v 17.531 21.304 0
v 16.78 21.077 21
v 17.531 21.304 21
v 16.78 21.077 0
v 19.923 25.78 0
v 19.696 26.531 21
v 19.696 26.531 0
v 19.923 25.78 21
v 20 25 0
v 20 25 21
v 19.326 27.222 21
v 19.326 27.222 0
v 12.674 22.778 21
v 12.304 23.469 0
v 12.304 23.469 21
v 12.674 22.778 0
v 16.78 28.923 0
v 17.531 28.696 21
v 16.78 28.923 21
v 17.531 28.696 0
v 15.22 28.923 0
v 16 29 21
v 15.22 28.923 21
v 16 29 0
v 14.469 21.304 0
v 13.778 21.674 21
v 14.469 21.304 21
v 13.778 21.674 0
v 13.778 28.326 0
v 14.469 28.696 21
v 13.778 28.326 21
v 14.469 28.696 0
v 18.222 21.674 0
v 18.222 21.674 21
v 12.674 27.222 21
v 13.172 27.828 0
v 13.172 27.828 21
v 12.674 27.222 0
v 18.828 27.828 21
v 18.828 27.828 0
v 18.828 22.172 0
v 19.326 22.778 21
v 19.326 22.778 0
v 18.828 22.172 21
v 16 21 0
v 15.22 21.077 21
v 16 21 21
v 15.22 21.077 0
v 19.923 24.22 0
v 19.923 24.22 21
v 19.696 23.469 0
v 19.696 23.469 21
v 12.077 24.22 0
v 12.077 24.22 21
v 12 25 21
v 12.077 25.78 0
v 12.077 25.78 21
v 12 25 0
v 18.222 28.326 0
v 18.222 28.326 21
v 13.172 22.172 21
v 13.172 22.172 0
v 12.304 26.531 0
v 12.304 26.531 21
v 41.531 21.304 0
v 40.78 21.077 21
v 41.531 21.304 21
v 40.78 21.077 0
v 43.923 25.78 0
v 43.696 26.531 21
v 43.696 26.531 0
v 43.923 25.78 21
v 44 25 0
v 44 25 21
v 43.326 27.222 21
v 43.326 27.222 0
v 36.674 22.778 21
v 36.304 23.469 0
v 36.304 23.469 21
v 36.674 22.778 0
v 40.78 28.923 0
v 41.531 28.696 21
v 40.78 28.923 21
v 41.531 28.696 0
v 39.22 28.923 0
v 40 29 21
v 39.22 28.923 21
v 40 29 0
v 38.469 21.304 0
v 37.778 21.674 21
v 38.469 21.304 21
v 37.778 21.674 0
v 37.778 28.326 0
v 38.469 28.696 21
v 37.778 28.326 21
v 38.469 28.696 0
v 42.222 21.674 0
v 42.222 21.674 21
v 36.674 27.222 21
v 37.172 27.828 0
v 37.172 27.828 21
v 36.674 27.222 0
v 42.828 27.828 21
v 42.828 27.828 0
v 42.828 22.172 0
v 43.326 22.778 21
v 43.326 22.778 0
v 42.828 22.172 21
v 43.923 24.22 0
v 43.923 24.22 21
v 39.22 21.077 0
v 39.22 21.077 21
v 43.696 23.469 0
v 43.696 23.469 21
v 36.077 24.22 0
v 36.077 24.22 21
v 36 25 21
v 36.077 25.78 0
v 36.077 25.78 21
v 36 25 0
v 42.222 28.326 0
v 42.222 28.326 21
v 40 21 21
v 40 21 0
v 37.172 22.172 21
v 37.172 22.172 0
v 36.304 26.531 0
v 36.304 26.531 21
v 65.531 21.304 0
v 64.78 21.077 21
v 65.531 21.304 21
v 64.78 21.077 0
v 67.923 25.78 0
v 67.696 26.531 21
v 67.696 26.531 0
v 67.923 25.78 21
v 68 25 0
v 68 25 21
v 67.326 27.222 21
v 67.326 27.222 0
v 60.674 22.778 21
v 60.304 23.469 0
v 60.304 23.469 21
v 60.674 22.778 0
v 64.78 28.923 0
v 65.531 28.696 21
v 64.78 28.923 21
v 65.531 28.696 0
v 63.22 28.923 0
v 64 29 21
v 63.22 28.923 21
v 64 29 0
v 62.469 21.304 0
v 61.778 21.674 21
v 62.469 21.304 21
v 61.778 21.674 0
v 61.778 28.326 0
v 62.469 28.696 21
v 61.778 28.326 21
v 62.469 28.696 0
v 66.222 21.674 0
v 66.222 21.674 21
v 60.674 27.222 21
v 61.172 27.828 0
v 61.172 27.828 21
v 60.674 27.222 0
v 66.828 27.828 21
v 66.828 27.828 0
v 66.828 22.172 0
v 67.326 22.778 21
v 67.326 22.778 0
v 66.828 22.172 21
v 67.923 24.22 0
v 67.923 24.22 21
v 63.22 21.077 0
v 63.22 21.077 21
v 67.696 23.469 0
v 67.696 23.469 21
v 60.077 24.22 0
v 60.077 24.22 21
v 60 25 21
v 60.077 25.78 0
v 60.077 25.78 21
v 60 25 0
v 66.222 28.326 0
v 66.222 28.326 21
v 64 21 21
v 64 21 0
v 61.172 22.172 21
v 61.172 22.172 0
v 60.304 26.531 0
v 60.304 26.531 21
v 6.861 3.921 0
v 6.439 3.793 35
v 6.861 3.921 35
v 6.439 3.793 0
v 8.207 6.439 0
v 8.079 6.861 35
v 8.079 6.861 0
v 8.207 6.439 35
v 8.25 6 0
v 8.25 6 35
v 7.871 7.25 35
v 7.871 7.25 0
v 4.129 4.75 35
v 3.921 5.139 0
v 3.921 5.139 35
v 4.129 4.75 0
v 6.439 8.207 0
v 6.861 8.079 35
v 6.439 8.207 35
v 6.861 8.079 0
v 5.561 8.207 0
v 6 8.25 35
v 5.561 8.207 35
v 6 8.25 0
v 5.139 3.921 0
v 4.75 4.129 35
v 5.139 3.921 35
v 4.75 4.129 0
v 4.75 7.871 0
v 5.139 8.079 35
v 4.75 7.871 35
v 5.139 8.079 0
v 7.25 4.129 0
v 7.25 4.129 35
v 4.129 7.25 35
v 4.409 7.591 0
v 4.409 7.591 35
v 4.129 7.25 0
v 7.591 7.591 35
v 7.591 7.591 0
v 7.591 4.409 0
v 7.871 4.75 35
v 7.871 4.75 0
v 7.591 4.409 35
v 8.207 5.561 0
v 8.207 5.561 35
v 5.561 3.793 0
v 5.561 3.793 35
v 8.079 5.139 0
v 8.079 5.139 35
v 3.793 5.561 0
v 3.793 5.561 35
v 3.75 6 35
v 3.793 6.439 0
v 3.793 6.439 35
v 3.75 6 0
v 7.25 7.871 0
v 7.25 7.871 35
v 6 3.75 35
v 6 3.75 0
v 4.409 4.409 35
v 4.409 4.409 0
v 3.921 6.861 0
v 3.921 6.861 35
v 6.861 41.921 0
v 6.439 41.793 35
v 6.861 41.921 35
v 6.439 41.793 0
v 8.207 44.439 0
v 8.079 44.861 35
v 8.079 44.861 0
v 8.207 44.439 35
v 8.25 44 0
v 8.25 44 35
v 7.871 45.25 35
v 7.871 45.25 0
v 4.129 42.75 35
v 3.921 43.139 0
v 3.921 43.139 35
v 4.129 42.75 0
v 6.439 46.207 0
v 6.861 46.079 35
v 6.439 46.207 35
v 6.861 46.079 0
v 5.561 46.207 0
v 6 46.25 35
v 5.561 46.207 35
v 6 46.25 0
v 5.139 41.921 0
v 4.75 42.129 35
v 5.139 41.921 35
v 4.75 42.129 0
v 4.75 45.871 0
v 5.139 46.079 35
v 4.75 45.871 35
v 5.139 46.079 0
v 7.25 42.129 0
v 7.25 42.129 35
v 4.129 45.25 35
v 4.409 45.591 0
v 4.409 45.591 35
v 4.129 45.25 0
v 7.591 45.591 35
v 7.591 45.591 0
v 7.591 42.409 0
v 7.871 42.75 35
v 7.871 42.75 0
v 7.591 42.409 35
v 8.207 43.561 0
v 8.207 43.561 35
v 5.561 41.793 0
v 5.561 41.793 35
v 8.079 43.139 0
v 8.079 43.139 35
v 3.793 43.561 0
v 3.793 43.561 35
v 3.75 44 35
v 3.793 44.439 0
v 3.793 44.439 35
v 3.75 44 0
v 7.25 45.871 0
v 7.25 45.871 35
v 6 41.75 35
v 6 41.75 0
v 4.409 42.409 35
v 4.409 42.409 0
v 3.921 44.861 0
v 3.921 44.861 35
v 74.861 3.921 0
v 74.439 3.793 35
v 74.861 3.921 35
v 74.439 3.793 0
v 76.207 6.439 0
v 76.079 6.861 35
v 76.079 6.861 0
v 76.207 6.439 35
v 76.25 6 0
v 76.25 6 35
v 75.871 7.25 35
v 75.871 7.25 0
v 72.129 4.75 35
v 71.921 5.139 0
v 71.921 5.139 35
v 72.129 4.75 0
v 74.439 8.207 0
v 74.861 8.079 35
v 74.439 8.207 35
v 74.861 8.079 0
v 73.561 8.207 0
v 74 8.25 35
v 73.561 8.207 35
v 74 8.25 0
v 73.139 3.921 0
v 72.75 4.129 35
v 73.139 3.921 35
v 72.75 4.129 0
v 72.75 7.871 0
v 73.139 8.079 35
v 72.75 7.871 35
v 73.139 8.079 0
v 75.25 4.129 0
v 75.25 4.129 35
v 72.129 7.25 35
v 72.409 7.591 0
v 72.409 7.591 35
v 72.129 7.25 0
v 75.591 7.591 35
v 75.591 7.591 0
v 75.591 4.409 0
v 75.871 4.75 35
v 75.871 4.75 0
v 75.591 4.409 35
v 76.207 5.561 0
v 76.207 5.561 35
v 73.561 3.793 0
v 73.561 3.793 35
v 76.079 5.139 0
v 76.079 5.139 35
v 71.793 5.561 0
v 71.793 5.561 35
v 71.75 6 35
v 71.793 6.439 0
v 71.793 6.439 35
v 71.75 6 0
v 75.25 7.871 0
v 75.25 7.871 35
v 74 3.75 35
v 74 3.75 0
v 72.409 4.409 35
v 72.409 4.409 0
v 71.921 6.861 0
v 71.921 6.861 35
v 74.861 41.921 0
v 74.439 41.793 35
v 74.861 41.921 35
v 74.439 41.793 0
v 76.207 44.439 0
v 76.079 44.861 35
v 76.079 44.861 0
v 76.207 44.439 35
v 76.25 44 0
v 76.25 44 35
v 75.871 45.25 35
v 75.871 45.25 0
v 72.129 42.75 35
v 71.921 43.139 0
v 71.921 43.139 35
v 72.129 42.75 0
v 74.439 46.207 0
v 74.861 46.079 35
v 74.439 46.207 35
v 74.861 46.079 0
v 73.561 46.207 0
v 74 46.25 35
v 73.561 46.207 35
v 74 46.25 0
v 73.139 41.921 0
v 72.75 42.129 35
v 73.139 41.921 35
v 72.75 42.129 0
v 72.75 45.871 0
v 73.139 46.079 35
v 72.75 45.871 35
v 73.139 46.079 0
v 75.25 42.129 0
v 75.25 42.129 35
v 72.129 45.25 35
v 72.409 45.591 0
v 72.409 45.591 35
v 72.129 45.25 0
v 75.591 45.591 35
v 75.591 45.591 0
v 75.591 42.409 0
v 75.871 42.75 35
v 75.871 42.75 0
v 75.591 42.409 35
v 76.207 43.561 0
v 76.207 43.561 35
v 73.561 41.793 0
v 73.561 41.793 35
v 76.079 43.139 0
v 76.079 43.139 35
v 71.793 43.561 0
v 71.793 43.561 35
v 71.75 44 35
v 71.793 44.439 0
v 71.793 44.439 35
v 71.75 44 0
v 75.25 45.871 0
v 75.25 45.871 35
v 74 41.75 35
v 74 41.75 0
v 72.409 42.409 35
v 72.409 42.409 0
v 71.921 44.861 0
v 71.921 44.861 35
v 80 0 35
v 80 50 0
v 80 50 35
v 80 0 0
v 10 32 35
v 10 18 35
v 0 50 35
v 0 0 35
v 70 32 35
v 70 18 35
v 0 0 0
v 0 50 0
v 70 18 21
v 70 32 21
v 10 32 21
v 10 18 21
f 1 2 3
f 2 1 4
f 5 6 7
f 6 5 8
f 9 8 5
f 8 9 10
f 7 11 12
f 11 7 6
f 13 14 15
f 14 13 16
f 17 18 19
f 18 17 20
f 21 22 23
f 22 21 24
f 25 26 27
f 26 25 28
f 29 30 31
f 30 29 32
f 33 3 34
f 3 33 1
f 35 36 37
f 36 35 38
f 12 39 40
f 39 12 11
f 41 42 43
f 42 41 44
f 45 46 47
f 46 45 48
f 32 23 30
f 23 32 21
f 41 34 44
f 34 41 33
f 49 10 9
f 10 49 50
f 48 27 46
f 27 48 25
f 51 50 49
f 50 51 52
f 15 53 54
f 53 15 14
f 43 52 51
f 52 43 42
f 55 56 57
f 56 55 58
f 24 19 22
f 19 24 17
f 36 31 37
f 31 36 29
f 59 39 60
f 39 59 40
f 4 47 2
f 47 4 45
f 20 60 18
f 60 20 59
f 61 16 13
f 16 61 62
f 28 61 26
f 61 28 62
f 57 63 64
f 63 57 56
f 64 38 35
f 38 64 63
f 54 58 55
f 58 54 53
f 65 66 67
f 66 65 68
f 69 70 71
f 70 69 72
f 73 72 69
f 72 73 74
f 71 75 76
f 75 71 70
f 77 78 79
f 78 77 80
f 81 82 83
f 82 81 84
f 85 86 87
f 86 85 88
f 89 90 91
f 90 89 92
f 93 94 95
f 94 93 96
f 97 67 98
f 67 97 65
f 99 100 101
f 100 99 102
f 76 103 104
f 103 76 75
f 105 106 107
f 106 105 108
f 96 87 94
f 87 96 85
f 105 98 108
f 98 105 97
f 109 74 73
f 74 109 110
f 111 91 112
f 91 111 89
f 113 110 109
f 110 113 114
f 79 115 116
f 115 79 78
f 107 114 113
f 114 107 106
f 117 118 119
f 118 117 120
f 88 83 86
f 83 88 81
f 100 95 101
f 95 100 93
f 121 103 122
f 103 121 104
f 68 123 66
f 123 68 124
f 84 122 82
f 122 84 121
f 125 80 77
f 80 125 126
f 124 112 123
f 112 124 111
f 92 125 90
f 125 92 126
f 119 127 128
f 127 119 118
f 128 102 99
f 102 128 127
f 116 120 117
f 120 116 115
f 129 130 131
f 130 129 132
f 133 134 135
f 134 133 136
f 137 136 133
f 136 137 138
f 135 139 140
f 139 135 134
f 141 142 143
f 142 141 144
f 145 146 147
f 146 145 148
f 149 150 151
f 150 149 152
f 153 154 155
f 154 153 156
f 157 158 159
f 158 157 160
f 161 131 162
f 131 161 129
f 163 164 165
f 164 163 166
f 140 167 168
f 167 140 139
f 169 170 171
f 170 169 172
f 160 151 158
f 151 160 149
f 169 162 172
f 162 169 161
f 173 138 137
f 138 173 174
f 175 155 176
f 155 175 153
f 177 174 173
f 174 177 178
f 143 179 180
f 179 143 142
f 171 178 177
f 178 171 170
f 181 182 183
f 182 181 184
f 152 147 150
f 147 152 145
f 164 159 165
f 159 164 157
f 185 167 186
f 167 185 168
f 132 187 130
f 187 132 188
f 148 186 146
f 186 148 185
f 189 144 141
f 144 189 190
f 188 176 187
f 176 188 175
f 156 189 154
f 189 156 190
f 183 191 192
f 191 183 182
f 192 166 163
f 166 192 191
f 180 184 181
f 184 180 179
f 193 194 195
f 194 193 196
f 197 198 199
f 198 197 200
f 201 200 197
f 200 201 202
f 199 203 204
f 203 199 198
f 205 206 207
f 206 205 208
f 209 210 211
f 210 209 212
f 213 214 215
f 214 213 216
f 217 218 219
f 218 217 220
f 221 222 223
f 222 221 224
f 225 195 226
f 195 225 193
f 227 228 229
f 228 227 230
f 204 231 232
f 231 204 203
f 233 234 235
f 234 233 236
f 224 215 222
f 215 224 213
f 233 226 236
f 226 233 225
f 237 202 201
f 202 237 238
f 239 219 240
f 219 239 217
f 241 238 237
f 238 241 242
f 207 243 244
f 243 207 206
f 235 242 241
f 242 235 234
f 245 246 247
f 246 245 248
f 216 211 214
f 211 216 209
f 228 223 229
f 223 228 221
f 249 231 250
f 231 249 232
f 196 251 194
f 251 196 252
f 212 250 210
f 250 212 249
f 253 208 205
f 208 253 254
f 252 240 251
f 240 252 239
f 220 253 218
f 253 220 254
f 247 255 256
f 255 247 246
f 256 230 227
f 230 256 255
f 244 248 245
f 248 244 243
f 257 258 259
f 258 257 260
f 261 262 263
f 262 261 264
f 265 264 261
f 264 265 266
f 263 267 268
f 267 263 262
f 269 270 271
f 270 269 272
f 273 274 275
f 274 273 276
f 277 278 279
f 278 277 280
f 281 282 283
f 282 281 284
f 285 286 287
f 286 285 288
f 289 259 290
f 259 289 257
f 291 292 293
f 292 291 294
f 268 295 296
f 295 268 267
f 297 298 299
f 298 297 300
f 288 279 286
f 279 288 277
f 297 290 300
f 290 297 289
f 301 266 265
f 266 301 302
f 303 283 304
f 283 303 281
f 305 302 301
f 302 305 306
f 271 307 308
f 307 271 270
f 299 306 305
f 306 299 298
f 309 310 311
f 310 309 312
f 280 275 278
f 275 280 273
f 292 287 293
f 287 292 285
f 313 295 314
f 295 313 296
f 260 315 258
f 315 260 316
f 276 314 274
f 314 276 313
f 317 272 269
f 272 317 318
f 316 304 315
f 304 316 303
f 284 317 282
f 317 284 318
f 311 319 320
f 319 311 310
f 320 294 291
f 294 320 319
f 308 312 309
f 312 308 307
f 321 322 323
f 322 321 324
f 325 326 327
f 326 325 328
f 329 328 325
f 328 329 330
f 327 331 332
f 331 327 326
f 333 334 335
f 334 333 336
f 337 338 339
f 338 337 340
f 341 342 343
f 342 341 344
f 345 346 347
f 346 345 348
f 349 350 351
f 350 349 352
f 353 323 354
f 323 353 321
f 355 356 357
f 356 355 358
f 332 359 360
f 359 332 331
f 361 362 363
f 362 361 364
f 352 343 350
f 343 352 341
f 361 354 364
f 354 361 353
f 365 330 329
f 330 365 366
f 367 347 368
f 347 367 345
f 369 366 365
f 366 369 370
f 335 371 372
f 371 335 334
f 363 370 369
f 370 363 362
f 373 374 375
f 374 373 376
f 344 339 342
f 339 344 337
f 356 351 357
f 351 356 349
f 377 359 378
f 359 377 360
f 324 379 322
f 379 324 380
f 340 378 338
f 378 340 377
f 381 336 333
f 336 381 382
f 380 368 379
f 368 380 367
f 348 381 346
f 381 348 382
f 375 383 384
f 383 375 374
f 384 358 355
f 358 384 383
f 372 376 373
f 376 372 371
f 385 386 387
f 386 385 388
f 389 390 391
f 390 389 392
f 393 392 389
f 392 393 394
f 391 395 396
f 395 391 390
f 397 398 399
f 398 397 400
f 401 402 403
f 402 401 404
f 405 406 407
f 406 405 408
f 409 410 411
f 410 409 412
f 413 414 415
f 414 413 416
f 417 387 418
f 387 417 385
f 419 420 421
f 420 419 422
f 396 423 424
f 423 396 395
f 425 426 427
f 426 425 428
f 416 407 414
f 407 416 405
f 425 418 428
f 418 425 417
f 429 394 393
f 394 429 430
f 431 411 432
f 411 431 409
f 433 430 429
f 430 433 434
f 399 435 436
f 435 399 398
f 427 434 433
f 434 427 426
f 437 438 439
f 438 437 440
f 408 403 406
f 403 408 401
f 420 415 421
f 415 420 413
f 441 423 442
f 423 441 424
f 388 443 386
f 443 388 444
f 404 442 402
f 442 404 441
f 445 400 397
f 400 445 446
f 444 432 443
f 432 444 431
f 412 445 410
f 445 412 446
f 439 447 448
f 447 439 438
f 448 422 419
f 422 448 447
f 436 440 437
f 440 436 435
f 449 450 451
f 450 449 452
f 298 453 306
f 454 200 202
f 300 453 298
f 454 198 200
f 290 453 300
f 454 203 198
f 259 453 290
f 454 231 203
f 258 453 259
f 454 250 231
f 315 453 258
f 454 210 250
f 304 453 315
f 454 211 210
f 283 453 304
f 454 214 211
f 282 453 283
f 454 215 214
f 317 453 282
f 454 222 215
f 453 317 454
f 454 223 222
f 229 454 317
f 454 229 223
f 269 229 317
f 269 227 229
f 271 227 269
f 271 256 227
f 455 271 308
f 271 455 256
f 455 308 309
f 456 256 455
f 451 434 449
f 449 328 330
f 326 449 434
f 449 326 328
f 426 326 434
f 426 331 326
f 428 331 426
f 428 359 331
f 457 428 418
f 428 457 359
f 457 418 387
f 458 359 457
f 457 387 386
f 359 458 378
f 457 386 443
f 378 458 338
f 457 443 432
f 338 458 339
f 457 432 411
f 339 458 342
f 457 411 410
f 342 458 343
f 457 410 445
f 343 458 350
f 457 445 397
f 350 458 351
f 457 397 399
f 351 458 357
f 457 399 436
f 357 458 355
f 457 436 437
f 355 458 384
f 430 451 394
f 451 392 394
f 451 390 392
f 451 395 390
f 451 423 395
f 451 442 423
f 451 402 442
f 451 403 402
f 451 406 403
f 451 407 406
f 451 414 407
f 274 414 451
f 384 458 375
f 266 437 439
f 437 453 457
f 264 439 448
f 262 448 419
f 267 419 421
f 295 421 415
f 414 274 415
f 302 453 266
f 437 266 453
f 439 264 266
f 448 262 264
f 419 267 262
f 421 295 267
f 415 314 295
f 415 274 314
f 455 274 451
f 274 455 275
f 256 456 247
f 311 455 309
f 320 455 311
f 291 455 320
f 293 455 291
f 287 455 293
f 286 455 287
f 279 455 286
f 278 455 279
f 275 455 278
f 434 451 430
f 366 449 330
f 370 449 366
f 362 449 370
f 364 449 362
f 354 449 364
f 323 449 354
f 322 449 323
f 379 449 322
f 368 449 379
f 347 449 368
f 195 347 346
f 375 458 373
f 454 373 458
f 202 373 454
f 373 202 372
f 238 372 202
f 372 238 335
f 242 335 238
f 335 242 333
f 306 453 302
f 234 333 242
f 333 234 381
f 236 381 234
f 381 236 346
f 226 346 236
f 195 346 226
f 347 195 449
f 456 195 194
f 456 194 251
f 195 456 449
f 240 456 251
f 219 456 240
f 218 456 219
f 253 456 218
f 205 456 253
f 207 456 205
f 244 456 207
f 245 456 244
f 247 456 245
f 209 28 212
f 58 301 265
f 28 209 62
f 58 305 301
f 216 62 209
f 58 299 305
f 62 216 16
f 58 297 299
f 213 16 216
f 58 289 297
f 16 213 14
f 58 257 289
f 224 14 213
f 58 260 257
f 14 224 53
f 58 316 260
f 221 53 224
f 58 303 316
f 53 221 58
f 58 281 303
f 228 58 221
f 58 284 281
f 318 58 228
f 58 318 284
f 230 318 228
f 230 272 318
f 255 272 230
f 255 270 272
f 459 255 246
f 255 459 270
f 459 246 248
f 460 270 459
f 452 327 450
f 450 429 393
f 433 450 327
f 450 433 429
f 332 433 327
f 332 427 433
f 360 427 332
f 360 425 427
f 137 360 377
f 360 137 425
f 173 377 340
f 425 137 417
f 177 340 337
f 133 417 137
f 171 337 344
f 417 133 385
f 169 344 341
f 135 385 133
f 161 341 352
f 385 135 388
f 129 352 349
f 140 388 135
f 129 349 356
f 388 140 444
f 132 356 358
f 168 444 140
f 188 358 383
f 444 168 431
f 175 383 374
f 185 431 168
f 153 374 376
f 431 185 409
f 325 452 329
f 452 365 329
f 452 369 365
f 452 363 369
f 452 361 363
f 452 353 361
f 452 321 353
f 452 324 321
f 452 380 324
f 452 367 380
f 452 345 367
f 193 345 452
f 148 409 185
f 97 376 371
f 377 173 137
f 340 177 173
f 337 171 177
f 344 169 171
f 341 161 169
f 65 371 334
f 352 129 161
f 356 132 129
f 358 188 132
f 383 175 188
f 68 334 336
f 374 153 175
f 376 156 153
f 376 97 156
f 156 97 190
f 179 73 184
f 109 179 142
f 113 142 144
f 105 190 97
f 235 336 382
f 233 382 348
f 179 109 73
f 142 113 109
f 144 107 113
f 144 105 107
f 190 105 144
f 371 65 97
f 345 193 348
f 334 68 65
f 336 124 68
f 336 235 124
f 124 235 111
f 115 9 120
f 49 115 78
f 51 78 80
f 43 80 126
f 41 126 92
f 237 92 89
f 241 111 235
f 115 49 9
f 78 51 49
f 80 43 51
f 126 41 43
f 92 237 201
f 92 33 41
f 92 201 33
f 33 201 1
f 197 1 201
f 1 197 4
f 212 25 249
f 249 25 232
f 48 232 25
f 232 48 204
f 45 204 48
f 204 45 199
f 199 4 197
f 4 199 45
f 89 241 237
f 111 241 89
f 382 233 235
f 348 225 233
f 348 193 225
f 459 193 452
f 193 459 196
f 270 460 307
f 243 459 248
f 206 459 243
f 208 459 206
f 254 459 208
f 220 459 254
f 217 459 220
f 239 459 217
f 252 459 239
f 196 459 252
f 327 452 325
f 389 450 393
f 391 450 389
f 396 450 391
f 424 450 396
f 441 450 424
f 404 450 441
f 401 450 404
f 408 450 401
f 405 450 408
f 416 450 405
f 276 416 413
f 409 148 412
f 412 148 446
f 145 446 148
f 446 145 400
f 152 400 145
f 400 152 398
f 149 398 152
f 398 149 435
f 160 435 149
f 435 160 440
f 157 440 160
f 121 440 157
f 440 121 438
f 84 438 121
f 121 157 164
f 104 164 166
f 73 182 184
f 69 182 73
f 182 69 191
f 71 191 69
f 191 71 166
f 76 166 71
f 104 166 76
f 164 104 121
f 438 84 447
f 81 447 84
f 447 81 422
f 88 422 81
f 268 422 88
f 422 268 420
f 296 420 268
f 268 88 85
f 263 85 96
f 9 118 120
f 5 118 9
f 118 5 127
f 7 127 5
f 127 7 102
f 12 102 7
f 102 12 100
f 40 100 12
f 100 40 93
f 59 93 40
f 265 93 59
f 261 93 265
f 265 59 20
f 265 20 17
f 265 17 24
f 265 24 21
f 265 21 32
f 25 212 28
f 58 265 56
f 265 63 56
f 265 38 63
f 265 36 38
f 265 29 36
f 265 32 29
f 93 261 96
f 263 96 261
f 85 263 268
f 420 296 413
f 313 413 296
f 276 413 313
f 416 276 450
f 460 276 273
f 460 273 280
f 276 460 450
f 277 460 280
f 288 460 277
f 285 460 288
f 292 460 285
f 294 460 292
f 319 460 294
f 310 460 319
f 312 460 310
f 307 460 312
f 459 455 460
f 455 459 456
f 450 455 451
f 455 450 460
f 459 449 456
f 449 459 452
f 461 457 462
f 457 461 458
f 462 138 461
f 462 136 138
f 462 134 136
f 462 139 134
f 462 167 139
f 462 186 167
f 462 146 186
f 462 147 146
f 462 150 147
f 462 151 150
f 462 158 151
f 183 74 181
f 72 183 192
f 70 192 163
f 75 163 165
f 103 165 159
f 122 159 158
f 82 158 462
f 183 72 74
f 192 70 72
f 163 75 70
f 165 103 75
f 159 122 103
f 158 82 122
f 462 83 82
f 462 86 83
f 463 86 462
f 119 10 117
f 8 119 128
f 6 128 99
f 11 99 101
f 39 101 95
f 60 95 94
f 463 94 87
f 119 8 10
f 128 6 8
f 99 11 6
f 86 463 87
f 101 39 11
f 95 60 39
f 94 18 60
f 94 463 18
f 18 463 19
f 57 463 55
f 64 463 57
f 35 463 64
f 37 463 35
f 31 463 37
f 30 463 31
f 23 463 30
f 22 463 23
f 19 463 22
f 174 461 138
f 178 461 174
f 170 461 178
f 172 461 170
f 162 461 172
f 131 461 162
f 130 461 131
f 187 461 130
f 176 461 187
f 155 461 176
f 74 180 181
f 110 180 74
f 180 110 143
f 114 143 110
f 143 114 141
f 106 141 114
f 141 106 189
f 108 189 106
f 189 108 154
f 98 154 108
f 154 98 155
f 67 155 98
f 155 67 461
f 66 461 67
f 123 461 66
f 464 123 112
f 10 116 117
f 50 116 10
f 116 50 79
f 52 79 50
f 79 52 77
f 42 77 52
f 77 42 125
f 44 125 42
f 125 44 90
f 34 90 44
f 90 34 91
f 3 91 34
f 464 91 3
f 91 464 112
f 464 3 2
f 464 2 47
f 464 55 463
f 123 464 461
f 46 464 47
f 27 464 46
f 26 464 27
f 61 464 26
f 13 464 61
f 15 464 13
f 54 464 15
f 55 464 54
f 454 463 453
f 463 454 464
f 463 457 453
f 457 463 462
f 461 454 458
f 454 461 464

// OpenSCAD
$fn = 32;

// ----------------------------------------------------------------------
// Manifold block: gallery_top manifold
// ----------------------------------------------------------------------

// --- parameters (mm) ---
block_l = 80;             // block length, X
block_w = 50;             // block width, Y
block_h = 35;             // block height, Z
port_d = 8;               // port bore diameter
port_pitch = 24;          // port pitch along X
gallery_d = 14;           // top gallery width, Y
gallery_depth = 14;       // gallery pocket depth
wall_p = 10;              // gallery end wall thickness, X
mnt_d = 4.5;              // mounting hole diameter
mnt_in = 6;               // mounting hole inset from the edges

n_ports = 3;  // ports in the row
port_x0 = (block_l - (n_ports - 1) * port_pitch) / 2;  // first port X

difference() {
  cube([block_l, block_w, block_h]);
  for (i = [0 : n_ports - 1])
    translate([port_x0 + i * port_pitch, block_w / 2, -1])
      cylinder(h = block_h + 2, d = port_d);
  translate([wall_p, block_w / 2 - gallery_d / 2, block_h - gallery_depth])
    cube([block_l - 2 * wall_p, gallery_d, gallery_depth + 1]);
  for (cx = [mnt_in, block_l - mnt_in])
    for (cy = [mnt_in, block_w - mnt_in])
      translate([cx, cy, -1]) cylinder(h = block_h + 2, d = mnt_d);
}
